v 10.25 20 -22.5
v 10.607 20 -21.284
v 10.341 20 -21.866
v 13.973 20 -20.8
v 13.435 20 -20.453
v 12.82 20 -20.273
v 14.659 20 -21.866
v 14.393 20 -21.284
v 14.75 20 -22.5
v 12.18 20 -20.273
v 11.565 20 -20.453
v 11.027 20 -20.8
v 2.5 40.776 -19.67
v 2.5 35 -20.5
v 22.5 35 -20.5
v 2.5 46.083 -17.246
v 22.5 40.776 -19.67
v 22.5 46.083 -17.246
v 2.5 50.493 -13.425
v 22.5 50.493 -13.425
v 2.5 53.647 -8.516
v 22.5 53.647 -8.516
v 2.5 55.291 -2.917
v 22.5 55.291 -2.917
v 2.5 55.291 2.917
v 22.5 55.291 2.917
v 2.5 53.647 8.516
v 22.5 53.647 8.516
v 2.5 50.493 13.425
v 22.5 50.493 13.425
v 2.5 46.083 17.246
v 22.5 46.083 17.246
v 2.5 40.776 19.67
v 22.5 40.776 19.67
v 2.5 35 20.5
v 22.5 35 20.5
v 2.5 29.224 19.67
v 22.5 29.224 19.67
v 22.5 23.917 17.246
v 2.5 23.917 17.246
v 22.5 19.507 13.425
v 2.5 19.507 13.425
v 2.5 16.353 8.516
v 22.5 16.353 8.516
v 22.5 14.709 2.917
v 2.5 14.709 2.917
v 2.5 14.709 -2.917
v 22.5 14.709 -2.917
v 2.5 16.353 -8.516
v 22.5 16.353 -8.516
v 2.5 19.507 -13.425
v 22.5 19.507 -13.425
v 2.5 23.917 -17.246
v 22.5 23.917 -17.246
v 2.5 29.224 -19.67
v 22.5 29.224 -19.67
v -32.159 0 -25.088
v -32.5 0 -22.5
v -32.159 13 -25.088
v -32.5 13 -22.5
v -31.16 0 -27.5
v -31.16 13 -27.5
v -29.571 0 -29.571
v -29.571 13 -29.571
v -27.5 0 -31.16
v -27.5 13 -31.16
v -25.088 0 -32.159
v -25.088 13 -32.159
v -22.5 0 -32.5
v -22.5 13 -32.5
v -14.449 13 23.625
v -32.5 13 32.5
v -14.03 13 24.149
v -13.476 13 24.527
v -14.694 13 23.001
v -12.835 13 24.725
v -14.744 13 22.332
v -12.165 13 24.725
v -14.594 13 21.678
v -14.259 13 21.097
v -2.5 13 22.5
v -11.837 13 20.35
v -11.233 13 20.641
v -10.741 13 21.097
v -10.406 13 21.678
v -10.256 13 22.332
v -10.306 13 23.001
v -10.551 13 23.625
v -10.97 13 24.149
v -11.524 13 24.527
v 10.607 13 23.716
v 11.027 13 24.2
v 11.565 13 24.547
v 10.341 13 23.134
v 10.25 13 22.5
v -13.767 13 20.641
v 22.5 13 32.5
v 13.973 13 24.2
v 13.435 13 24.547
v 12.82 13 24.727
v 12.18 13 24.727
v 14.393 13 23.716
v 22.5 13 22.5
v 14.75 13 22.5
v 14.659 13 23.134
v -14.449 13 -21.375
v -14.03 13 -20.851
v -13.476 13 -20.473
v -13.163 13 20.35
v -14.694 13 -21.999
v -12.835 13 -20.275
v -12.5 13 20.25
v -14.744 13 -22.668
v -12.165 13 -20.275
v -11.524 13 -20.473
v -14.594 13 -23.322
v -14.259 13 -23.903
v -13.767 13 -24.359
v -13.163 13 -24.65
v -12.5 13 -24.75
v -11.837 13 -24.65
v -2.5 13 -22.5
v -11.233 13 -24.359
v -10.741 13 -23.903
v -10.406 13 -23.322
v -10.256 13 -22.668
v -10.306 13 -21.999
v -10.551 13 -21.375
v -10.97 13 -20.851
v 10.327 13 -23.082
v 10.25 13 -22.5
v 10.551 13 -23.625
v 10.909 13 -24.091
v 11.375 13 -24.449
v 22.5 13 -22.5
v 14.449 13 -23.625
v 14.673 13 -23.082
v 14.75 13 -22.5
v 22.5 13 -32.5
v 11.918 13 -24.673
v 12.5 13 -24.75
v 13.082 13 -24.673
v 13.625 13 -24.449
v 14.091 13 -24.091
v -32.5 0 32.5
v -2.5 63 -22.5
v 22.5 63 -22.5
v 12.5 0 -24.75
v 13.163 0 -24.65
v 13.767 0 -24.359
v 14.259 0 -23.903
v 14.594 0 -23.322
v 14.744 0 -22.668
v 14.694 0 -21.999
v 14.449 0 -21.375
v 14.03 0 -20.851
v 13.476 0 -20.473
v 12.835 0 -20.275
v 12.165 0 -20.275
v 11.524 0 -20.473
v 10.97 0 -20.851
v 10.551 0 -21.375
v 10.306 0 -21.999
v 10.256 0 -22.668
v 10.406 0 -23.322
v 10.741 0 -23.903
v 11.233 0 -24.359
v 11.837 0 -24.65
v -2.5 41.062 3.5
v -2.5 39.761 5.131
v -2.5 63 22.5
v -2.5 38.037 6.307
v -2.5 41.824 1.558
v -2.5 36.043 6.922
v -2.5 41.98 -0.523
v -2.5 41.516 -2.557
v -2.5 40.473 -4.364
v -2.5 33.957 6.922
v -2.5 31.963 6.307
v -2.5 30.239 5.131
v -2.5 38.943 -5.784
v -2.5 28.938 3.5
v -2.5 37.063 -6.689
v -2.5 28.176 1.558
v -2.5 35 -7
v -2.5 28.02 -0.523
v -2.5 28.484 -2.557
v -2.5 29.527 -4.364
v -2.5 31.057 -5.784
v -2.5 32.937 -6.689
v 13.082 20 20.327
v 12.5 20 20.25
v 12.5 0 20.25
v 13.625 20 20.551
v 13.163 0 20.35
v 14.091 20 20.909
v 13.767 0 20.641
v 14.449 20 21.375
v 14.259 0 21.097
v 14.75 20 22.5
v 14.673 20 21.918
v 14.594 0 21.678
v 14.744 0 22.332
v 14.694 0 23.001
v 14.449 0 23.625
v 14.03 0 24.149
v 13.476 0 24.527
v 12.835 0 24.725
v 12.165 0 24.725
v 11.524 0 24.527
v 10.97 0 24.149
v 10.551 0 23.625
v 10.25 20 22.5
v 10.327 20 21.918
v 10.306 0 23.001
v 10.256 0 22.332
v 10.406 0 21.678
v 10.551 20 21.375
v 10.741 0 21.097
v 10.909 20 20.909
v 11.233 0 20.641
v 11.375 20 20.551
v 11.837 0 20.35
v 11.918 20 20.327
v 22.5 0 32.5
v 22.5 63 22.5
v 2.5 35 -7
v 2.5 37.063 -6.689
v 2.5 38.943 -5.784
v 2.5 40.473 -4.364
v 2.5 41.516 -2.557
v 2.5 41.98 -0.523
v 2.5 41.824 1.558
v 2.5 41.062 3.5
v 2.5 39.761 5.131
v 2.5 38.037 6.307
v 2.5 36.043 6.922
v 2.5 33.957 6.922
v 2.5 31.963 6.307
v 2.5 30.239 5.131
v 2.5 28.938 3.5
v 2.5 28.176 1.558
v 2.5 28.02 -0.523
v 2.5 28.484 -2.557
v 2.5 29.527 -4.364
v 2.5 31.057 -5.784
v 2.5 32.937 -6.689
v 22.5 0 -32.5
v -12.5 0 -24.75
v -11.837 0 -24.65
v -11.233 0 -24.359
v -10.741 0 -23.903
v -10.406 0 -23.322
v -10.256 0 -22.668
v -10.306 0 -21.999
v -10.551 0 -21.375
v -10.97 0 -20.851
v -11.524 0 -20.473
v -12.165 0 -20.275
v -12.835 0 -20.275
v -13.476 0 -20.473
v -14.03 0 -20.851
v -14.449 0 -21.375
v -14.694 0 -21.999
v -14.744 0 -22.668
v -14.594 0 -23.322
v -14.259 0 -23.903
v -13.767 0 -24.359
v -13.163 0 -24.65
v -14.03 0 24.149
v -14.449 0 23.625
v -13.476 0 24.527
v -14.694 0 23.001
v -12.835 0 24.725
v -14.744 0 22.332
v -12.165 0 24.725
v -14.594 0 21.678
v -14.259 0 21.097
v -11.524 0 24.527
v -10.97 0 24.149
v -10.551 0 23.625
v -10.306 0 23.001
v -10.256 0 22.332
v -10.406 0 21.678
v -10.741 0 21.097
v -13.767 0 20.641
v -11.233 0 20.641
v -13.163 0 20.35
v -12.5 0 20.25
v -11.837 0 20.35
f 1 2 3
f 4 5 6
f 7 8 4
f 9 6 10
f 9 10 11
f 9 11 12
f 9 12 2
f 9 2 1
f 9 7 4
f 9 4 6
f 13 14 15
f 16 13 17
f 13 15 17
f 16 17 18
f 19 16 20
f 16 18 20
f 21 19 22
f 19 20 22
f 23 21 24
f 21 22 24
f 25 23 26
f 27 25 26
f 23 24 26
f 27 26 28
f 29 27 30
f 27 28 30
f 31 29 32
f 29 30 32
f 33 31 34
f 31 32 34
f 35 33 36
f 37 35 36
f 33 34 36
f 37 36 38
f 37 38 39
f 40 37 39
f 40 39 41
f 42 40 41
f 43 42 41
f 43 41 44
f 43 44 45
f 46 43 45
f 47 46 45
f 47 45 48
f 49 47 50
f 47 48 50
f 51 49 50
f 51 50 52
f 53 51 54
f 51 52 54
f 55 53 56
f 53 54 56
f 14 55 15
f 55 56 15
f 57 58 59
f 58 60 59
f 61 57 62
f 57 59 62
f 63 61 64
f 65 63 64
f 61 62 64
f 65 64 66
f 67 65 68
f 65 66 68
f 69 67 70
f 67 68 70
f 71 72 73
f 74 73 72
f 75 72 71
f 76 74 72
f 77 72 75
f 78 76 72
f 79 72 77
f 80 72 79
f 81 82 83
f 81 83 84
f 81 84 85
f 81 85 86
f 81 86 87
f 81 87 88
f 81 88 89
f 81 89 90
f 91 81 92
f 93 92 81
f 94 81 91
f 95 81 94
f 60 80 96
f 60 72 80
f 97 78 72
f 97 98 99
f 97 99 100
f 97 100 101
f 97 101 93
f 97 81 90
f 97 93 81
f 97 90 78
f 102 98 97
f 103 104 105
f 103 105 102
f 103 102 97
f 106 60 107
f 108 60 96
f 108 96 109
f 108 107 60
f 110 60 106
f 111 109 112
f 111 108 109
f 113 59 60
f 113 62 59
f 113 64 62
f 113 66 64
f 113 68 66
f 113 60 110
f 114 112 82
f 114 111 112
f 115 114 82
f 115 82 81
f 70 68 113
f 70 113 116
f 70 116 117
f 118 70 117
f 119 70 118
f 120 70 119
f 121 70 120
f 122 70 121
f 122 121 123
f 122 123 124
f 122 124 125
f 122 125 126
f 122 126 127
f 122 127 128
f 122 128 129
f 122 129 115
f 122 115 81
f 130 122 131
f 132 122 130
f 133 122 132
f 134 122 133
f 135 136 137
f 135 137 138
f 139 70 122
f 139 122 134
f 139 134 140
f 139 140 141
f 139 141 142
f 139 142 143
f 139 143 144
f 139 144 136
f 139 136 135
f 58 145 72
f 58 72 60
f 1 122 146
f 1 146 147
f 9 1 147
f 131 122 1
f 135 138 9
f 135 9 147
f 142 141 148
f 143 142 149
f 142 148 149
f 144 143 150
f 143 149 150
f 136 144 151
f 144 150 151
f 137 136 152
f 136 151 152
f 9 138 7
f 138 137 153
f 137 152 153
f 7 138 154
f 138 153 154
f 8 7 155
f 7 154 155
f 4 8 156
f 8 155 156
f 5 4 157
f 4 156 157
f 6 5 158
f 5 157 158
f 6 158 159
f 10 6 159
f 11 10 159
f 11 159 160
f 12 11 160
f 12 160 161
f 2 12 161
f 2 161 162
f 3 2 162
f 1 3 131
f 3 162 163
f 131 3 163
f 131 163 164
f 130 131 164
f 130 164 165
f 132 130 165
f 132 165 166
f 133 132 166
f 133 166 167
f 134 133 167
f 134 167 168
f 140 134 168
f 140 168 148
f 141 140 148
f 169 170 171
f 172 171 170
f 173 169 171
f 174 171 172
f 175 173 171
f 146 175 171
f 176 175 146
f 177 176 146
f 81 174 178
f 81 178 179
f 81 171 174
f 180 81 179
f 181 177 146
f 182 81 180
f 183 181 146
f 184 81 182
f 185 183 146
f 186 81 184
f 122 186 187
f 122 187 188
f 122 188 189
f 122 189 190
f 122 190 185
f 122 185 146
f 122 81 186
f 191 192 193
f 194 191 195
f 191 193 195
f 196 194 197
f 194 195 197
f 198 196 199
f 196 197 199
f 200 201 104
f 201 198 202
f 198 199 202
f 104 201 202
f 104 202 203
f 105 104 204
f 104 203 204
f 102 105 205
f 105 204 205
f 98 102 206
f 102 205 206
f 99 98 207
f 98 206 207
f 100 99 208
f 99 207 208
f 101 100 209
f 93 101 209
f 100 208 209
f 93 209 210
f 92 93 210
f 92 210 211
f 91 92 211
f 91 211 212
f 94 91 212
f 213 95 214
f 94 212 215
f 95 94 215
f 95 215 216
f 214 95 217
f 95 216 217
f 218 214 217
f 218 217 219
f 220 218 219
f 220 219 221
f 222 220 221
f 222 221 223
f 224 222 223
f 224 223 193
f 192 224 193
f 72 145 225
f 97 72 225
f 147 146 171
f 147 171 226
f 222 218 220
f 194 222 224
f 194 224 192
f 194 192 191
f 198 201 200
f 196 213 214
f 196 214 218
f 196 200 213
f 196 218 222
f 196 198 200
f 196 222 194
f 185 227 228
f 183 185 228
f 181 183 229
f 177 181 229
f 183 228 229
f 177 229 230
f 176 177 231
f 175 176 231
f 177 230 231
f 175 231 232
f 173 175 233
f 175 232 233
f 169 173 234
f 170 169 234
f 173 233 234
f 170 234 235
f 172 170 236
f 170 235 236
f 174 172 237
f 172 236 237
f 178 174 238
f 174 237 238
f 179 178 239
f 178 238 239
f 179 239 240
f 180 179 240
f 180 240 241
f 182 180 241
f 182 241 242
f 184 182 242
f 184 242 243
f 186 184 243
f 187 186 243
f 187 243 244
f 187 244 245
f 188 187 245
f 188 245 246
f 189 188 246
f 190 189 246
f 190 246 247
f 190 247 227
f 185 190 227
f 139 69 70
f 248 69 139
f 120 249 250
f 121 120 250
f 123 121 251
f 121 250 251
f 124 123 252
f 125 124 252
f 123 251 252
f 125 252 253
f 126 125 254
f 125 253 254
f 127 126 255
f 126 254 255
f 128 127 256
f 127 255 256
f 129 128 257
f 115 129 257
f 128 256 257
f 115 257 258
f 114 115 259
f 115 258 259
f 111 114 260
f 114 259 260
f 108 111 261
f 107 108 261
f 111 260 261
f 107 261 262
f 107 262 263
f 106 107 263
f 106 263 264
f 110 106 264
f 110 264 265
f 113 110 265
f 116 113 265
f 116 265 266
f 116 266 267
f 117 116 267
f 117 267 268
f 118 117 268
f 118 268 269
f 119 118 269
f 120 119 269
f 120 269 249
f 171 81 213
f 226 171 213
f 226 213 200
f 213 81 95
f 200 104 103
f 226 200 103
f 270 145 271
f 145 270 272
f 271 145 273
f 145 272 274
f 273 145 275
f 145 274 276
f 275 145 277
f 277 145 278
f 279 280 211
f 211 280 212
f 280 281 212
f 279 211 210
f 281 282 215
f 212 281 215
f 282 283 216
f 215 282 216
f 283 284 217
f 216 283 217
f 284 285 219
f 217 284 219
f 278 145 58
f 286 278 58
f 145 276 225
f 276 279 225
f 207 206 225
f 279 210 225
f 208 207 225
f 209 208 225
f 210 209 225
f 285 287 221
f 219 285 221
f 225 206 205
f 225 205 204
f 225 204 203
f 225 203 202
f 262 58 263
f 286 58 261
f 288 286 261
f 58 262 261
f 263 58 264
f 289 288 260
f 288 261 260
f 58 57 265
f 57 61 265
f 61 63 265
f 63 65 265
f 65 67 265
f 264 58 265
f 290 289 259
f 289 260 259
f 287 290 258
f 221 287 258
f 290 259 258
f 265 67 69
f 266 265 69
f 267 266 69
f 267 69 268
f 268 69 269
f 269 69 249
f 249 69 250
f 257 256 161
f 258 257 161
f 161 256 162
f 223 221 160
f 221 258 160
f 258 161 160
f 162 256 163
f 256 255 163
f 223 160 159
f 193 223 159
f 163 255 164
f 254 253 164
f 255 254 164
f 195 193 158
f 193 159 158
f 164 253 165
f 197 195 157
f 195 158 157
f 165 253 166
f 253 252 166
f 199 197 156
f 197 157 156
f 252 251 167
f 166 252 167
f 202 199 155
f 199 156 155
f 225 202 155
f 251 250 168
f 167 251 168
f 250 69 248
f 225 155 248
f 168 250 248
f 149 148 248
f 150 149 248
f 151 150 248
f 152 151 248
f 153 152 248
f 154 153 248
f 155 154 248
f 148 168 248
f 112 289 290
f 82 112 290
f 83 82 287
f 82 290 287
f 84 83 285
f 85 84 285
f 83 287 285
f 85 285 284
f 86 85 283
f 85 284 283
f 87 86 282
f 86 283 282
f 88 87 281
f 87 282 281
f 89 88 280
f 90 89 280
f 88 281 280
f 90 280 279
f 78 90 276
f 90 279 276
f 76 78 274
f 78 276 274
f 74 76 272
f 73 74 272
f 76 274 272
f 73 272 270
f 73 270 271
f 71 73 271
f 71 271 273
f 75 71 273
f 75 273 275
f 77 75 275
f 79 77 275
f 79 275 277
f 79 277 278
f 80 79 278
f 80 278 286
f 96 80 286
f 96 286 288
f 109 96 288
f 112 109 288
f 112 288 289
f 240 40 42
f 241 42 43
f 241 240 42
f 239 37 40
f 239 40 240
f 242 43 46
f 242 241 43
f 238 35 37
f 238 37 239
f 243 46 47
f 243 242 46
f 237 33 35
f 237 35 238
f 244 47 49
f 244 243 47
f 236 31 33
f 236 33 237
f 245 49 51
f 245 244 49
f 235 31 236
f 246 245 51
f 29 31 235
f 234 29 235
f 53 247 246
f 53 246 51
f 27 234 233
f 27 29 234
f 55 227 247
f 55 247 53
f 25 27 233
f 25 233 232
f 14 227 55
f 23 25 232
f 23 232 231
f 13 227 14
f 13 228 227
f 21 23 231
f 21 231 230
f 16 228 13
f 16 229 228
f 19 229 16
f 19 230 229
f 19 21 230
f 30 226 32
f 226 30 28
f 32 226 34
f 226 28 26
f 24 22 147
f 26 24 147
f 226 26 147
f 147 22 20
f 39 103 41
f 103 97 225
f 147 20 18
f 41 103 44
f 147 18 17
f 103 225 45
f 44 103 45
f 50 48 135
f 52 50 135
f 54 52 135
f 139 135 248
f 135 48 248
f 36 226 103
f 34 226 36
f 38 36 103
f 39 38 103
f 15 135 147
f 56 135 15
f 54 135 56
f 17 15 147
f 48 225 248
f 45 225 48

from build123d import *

# Parameters (mm, degrees)
SKETCH1_W           = 55
SKETCH1_H           = 65
BOSS_EXTRUDE1_DEPTH = 13
SKETCH2_W           = 25
SKETCH2_H           = 45
BOSS_EXTRUDE2_DEPTH = 50
SKETCH5_R           = 20.5
CUT_EXTRUDE1_DEPTH  = 20
SKETCH7_R           = 7
CUT_EXTRUDE2_DEPTH  = 20
SKETCH8_R           = 2.25
CUT_EXTRUDE3_DEPTH  = 20
FILLET1_R           = 10


with BuildPart() as part:
    # Sketch1 → Boss-Extrude1 (new body)
    with BuildSketch(Plane(origin=(0, 0, 0), x_dir=(1, 0, 0), z_dir=(0, 1, 0))):
        with Locations((-5, 0)):
            Rectangle(SKETCH1_W, SKETCH1_H)
    extrude(amount=BOSS_EXTRUDE1_DEPTH)

    # Sketch2 → Boss-Extrude2 (add)
    with BuildSketch(Plane(origin=(0, 13, 0), x_dir=(1, 0, 0), z_dir=(0, 1, 0))):
        with Locations((10, 0)):
            Rectangle(SKETCH2_W, SKETCH2_H)
    extrude(amount=BOSS_EXTRUDE2_DEPTH)

    # Sketch5 → Cut-Extrude1 (cut)
    with BuildSketch(Plane(origin=(22.5, 0, 0), x_dir=(0, 0, -1), z_dir=(1, 0, 0))):
        with Locations((0, 35)):
            Circle(SKETCH5_R)
    extrude(amount=-CUT_EXTRUDE1_DEPTH, mode=Mode.SUBTRACT)

    # Sketch7 → Cut-Extrude2 (cut)
    with BuildSketch(Plane(origin=(2.5, 0, 0), x_dir=(0, 0, -1), z_dir=(1, 0, 0))):
        with Locations((0, 35)):
            Circle(SKETCH7_R)
    extrude(amount=-CUT_EXTRUDE2_DEPTH, mode=Mode.SUBTRACT)

    # Sketch8 → Cut-Extrude3 (cut)
    with BuildSketch(Plane(origin=(0, 0, 0), x_dir=(-1, 0, 0), z_dir=(0, -1, 0))):
        with Locations(Location((12.5, -22.5, 0), (0, 0, 90))):
            Circle(SKETCH8_R)
        with Locations(Location((12.5, 22.5, 0), (0, 0, 90))):
            Circle(SKETCH8_R)
        with Locations(Location((-12.5, 22.5, 0), (0, 0, 90))):
            Circle(SKETCH8_R)
        with Locations(Location((-12.5, -22.5, 0), (0, 0, 90))):
            Circle(SKETCH8_R)
    extrude(amount=-CUT_EXTRUDE3_DEPTH, mode=Mode.SUBTRACT)

    # Fillet1
    fillet1_edges = [part.edges().sort_by_distance(p)[0] for p in [
        (-32.5, 6.5, -32.5),
    ]]
    fillet(fillet1_edges, radius=FILLET1_R)


solid = part.part
